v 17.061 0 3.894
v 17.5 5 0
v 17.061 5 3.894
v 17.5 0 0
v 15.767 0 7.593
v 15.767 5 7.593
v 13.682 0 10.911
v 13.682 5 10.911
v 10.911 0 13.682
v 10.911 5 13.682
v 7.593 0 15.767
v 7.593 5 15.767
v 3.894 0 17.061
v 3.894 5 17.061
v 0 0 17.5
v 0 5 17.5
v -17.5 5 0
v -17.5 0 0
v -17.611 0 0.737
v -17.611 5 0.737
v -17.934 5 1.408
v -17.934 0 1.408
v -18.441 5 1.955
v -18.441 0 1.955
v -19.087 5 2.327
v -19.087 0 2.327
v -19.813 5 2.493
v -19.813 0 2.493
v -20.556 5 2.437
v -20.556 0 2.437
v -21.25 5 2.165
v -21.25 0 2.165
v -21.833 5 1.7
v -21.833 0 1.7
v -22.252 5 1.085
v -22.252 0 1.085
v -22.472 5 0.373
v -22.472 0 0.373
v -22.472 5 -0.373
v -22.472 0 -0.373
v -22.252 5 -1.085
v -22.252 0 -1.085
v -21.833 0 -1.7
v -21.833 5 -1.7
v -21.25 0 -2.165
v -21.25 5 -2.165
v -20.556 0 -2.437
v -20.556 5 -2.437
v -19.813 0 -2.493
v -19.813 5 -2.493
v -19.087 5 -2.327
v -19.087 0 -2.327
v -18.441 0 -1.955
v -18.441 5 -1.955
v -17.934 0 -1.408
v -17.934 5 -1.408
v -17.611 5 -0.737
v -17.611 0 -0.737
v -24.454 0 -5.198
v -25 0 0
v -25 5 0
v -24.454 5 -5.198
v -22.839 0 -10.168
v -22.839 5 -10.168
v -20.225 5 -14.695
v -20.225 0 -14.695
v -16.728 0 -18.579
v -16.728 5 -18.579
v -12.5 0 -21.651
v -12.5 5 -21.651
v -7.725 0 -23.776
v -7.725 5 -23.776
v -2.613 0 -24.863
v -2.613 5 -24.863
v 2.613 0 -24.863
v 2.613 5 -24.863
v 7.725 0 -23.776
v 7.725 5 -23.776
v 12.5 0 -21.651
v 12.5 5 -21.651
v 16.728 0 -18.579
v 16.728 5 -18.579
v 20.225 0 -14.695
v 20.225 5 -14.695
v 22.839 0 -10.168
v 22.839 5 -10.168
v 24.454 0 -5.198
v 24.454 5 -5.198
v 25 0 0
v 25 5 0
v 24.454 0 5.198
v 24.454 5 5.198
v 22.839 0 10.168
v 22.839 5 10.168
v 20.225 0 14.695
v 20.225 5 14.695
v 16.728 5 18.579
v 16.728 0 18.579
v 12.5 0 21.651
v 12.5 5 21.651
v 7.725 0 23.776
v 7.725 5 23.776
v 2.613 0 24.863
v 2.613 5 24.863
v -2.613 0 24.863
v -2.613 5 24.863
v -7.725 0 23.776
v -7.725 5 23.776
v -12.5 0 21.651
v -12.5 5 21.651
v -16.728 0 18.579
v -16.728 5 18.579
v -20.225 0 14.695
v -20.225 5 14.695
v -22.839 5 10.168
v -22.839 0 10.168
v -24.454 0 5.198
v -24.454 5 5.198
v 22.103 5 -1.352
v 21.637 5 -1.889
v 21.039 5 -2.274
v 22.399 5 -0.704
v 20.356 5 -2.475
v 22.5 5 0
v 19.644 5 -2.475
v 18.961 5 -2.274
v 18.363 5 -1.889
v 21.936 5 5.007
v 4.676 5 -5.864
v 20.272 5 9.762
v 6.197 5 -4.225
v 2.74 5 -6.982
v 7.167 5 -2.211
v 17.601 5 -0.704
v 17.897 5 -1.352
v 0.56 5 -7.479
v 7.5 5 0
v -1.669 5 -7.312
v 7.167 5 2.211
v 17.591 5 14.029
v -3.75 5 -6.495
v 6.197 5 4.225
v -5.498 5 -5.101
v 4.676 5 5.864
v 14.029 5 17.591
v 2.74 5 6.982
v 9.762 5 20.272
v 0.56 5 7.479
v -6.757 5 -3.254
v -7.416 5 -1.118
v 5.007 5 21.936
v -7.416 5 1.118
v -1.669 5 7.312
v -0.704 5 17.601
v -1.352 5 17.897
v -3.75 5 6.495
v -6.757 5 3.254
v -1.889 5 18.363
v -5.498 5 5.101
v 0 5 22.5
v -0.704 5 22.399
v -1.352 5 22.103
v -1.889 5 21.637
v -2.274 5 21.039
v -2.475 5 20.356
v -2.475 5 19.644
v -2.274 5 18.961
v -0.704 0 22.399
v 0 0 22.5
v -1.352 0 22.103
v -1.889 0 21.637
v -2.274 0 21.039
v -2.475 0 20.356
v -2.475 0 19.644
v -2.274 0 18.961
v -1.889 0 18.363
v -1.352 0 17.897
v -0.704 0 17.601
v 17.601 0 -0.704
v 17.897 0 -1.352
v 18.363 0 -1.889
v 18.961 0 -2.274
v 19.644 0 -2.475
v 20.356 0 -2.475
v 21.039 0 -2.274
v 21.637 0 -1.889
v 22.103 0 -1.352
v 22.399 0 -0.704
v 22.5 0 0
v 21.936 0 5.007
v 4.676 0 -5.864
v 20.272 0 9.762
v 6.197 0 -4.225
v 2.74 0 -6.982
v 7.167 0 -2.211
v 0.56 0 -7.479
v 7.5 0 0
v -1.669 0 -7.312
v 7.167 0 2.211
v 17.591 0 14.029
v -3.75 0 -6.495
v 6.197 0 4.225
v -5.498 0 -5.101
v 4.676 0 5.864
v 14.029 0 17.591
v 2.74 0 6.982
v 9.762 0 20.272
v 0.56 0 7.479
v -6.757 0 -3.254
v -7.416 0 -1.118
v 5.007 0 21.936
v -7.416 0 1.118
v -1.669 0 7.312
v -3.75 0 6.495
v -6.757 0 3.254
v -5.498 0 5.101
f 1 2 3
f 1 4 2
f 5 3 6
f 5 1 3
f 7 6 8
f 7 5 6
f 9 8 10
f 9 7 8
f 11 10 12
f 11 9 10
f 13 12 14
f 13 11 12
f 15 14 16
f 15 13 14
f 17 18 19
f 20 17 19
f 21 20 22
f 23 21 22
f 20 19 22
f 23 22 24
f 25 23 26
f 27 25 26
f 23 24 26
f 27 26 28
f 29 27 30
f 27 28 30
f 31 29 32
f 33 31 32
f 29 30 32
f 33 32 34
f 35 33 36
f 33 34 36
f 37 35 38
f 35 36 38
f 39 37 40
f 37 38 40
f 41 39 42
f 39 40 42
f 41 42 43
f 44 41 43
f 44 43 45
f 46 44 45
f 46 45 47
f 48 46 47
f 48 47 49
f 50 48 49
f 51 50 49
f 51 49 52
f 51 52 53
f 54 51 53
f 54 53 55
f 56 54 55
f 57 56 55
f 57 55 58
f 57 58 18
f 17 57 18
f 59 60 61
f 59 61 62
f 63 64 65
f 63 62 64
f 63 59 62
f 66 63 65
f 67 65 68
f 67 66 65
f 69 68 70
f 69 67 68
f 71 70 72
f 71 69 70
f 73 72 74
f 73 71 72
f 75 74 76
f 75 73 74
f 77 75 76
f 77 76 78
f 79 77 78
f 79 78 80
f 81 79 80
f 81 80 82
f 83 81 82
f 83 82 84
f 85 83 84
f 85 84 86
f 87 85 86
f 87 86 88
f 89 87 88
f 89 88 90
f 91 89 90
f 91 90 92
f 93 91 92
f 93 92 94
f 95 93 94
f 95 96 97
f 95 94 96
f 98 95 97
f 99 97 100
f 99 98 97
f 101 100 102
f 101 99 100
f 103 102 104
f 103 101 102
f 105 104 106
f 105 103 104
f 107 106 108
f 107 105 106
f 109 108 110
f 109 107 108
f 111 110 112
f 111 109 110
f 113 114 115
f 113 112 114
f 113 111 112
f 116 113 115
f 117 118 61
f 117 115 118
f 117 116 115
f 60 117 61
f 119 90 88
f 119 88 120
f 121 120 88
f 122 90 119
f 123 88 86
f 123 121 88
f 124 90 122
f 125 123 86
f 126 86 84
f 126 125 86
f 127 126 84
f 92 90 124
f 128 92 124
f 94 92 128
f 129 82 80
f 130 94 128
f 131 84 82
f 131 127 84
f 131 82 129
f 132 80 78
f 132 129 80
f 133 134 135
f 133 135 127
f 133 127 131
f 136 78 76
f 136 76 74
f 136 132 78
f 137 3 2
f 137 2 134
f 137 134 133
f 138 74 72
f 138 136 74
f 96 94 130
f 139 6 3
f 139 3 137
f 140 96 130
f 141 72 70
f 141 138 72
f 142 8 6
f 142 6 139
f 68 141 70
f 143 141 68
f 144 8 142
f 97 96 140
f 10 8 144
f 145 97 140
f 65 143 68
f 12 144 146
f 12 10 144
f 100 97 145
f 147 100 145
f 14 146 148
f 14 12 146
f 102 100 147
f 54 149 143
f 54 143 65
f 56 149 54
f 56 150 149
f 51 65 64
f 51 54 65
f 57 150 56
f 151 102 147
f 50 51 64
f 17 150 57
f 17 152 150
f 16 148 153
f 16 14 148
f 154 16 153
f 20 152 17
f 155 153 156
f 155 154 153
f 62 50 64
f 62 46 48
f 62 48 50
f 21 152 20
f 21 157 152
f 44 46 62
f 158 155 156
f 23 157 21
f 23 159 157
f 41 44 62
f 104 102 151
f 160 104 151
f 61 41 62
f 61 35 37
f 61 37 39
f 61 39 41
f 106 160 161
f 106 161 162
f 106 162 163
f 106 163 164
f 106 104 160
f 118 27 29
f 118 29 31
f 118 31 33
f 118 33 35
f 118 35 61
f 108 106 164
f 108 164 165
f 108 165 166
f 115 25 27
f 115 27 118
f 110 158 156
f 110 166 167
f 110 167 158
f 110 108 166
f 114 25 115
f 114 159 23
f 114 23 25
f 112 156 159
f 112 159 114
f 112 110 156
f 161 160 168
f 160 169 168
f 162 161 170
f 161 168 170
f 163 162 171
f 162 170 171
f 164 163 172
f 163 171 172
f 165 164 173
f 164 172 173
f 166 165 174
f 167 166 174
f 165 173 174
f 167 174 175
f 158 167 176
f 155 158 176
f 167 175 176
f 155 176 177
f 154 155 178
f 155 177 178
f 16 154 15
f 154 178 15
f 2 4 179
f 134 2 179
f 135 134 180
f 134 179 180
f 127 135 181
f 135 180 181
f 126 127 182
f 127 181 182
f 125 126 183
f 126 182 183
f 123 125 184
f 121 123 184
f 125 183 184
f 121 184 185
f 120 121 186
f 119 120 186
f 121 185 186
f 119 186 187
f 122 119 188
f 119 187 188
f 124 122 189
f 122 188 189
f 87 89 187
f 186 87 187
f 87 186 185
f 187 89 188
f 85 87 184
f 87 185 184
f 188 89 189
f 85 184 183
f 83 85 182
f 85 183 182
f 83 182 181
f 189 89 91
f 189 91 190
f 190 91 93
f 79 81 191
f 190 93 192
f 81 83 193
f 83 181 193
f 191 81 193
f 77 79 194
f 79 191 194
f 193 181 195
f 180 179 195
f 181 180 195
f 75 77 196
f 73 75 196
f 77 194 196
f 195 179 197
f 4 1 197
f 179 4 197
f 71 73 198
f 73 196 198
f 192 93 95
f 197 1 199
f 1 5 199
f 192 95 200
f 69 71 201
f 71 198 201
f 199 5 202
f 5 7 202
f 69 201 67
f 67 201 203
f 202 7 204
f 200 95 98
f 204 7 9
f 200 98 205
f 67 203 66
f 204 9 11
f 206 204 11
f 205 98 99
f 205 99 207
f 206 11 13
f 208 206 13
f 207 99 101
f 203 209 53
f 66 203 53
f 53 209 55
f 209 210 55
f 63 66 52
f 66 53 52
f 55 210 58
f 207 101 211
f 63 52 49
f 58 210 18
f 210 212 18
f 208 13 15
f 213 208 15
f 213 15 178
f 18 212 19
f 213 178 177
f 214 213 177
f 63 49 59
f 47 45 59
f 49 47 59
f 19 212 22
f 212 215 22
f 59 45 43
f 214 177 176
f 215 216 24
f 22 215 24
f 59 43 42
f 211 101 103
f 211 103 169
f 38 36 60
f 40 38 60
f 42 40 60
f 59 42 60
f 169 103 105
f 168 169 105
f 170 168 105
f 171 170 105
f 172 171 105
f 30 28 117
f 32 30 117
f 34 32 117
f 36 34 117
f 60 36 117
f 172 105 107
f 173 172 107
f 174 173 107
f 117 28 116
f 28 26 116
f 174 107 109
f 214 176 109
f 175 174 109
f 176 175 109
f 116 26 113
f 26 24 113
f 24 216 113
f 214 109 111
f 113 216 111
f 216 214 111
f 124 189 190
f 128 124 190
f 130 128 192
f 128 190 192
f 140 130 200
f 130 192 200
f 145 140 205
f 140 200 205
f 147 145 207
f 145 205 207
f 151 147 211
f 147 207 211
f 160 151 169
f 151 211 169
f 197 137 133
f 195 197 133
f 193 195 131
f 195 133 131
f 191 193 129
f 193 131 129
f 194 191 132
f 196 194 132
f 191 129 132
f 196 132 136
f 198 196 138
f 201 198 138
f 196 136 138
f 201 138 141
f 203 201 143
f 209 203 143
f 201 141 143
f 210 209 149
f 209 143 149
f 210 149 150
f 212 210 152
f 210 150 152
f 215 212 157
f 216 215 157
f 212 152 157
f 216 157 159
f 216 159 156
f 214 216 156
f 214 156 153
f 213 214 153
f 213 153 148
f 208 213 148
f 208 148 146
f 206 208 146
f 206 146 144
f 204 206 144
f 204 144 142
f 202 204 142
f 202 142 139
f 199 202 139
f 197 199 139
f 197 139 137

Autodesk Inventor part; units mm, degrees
ref_plane "YZ Plane" through (0, 0, 0) normal (1, 0, 0) x (0, 1, 0)
ref_plane "XZ Plane" through (0, 0, 0) normal (0, 1, 0) x (-1, 0, 0)
ref_plane "XY Plane" through (0, 0, 0) normal (0, 0, 1) x (1, 0, 0)
sketch "Sketch1" plane through (0, 0, 0) normal (0, 1, 0) x (-1, 0, 0)
  circle A0 centre (0, 0) radius 25
  dimension "d0" = 50
extrude "Extrusion1" add sketch "Sketch1" along normal blind 5
sketch "Sketch2" plane through (0, 5, 0) normal (0, 1, 0) x (1, 0, 0)
  circle A0 centre (0, 0) radius 7.5
  dimension "d3" = 15
extrude "Extrusion2" cut sketch "Sketch2" against normal through all
sketch "Sketch4" plane through (0, 0, 0) normal (0, -1, 0) x (1, 0, 0)
  circle A0 centre (0, 0) radius 20 construction
  arc A1 (0, 22.5) -> (0, 17.5) centre (0, 20) ccw
  arc A2 (17.5, 0) -> (22.5, 0) centre (20, 0) ccw
  arc A3 (22.5, 0) -> (0, 22.5) centre (0, 0) ccw
  arc A4 (17.5, 0) -> (0, 17.5) centre (0, 0) ccw
  circle A5 centre (0, 0) radius 7.5 projected
  circle A6 centre (0, 0) radius 25 projected
  dimension "d9" = 5
  dimension "d10" = 5
  dimension "d11" = 90
extrude "Extrusion3" cut sketch "Sketch4" against normal through all contours A3 A2 A4 A1
sketch "Sketch8" plane through (0, 0, 0) normal (0, -1, 0) x (1, 0, 0)
  circle A0 centre (0, 0) radius 20 construction
  arc A1 (22.5, 0) -> (0, 22.5) centre (0, 0) ccw projected
  arc A2 (17.5, 0) -> (22.5, 0) centre (20, 0) ccw projected
  arc A3 (17.5, 0) -> (0, 17.5) centre (0, 0) ccw projected
  arc A4 (0, 22.5) -> (0, 17.5) centre (0, 20) ccw projected
  circle A5 centre (0, 0) radius 7.5 projected
  circle A6 centre (0, 0) radius 25 projected
  arc A7 (17.5, 0) -> (0, 17.5) centre (0, 0) ccw projected
  circle A8 centre (0, 0) radius 25 projected
  circle A9 centre (-20, 0) radius 2.5
  dimension "d15" = 5
extrude "Extrusion4" cut sketch "Sketch8" against normal through all contours A9
equation "\"kat_promienia\" = 30deg"
properties part number "sprzeglo_02"
